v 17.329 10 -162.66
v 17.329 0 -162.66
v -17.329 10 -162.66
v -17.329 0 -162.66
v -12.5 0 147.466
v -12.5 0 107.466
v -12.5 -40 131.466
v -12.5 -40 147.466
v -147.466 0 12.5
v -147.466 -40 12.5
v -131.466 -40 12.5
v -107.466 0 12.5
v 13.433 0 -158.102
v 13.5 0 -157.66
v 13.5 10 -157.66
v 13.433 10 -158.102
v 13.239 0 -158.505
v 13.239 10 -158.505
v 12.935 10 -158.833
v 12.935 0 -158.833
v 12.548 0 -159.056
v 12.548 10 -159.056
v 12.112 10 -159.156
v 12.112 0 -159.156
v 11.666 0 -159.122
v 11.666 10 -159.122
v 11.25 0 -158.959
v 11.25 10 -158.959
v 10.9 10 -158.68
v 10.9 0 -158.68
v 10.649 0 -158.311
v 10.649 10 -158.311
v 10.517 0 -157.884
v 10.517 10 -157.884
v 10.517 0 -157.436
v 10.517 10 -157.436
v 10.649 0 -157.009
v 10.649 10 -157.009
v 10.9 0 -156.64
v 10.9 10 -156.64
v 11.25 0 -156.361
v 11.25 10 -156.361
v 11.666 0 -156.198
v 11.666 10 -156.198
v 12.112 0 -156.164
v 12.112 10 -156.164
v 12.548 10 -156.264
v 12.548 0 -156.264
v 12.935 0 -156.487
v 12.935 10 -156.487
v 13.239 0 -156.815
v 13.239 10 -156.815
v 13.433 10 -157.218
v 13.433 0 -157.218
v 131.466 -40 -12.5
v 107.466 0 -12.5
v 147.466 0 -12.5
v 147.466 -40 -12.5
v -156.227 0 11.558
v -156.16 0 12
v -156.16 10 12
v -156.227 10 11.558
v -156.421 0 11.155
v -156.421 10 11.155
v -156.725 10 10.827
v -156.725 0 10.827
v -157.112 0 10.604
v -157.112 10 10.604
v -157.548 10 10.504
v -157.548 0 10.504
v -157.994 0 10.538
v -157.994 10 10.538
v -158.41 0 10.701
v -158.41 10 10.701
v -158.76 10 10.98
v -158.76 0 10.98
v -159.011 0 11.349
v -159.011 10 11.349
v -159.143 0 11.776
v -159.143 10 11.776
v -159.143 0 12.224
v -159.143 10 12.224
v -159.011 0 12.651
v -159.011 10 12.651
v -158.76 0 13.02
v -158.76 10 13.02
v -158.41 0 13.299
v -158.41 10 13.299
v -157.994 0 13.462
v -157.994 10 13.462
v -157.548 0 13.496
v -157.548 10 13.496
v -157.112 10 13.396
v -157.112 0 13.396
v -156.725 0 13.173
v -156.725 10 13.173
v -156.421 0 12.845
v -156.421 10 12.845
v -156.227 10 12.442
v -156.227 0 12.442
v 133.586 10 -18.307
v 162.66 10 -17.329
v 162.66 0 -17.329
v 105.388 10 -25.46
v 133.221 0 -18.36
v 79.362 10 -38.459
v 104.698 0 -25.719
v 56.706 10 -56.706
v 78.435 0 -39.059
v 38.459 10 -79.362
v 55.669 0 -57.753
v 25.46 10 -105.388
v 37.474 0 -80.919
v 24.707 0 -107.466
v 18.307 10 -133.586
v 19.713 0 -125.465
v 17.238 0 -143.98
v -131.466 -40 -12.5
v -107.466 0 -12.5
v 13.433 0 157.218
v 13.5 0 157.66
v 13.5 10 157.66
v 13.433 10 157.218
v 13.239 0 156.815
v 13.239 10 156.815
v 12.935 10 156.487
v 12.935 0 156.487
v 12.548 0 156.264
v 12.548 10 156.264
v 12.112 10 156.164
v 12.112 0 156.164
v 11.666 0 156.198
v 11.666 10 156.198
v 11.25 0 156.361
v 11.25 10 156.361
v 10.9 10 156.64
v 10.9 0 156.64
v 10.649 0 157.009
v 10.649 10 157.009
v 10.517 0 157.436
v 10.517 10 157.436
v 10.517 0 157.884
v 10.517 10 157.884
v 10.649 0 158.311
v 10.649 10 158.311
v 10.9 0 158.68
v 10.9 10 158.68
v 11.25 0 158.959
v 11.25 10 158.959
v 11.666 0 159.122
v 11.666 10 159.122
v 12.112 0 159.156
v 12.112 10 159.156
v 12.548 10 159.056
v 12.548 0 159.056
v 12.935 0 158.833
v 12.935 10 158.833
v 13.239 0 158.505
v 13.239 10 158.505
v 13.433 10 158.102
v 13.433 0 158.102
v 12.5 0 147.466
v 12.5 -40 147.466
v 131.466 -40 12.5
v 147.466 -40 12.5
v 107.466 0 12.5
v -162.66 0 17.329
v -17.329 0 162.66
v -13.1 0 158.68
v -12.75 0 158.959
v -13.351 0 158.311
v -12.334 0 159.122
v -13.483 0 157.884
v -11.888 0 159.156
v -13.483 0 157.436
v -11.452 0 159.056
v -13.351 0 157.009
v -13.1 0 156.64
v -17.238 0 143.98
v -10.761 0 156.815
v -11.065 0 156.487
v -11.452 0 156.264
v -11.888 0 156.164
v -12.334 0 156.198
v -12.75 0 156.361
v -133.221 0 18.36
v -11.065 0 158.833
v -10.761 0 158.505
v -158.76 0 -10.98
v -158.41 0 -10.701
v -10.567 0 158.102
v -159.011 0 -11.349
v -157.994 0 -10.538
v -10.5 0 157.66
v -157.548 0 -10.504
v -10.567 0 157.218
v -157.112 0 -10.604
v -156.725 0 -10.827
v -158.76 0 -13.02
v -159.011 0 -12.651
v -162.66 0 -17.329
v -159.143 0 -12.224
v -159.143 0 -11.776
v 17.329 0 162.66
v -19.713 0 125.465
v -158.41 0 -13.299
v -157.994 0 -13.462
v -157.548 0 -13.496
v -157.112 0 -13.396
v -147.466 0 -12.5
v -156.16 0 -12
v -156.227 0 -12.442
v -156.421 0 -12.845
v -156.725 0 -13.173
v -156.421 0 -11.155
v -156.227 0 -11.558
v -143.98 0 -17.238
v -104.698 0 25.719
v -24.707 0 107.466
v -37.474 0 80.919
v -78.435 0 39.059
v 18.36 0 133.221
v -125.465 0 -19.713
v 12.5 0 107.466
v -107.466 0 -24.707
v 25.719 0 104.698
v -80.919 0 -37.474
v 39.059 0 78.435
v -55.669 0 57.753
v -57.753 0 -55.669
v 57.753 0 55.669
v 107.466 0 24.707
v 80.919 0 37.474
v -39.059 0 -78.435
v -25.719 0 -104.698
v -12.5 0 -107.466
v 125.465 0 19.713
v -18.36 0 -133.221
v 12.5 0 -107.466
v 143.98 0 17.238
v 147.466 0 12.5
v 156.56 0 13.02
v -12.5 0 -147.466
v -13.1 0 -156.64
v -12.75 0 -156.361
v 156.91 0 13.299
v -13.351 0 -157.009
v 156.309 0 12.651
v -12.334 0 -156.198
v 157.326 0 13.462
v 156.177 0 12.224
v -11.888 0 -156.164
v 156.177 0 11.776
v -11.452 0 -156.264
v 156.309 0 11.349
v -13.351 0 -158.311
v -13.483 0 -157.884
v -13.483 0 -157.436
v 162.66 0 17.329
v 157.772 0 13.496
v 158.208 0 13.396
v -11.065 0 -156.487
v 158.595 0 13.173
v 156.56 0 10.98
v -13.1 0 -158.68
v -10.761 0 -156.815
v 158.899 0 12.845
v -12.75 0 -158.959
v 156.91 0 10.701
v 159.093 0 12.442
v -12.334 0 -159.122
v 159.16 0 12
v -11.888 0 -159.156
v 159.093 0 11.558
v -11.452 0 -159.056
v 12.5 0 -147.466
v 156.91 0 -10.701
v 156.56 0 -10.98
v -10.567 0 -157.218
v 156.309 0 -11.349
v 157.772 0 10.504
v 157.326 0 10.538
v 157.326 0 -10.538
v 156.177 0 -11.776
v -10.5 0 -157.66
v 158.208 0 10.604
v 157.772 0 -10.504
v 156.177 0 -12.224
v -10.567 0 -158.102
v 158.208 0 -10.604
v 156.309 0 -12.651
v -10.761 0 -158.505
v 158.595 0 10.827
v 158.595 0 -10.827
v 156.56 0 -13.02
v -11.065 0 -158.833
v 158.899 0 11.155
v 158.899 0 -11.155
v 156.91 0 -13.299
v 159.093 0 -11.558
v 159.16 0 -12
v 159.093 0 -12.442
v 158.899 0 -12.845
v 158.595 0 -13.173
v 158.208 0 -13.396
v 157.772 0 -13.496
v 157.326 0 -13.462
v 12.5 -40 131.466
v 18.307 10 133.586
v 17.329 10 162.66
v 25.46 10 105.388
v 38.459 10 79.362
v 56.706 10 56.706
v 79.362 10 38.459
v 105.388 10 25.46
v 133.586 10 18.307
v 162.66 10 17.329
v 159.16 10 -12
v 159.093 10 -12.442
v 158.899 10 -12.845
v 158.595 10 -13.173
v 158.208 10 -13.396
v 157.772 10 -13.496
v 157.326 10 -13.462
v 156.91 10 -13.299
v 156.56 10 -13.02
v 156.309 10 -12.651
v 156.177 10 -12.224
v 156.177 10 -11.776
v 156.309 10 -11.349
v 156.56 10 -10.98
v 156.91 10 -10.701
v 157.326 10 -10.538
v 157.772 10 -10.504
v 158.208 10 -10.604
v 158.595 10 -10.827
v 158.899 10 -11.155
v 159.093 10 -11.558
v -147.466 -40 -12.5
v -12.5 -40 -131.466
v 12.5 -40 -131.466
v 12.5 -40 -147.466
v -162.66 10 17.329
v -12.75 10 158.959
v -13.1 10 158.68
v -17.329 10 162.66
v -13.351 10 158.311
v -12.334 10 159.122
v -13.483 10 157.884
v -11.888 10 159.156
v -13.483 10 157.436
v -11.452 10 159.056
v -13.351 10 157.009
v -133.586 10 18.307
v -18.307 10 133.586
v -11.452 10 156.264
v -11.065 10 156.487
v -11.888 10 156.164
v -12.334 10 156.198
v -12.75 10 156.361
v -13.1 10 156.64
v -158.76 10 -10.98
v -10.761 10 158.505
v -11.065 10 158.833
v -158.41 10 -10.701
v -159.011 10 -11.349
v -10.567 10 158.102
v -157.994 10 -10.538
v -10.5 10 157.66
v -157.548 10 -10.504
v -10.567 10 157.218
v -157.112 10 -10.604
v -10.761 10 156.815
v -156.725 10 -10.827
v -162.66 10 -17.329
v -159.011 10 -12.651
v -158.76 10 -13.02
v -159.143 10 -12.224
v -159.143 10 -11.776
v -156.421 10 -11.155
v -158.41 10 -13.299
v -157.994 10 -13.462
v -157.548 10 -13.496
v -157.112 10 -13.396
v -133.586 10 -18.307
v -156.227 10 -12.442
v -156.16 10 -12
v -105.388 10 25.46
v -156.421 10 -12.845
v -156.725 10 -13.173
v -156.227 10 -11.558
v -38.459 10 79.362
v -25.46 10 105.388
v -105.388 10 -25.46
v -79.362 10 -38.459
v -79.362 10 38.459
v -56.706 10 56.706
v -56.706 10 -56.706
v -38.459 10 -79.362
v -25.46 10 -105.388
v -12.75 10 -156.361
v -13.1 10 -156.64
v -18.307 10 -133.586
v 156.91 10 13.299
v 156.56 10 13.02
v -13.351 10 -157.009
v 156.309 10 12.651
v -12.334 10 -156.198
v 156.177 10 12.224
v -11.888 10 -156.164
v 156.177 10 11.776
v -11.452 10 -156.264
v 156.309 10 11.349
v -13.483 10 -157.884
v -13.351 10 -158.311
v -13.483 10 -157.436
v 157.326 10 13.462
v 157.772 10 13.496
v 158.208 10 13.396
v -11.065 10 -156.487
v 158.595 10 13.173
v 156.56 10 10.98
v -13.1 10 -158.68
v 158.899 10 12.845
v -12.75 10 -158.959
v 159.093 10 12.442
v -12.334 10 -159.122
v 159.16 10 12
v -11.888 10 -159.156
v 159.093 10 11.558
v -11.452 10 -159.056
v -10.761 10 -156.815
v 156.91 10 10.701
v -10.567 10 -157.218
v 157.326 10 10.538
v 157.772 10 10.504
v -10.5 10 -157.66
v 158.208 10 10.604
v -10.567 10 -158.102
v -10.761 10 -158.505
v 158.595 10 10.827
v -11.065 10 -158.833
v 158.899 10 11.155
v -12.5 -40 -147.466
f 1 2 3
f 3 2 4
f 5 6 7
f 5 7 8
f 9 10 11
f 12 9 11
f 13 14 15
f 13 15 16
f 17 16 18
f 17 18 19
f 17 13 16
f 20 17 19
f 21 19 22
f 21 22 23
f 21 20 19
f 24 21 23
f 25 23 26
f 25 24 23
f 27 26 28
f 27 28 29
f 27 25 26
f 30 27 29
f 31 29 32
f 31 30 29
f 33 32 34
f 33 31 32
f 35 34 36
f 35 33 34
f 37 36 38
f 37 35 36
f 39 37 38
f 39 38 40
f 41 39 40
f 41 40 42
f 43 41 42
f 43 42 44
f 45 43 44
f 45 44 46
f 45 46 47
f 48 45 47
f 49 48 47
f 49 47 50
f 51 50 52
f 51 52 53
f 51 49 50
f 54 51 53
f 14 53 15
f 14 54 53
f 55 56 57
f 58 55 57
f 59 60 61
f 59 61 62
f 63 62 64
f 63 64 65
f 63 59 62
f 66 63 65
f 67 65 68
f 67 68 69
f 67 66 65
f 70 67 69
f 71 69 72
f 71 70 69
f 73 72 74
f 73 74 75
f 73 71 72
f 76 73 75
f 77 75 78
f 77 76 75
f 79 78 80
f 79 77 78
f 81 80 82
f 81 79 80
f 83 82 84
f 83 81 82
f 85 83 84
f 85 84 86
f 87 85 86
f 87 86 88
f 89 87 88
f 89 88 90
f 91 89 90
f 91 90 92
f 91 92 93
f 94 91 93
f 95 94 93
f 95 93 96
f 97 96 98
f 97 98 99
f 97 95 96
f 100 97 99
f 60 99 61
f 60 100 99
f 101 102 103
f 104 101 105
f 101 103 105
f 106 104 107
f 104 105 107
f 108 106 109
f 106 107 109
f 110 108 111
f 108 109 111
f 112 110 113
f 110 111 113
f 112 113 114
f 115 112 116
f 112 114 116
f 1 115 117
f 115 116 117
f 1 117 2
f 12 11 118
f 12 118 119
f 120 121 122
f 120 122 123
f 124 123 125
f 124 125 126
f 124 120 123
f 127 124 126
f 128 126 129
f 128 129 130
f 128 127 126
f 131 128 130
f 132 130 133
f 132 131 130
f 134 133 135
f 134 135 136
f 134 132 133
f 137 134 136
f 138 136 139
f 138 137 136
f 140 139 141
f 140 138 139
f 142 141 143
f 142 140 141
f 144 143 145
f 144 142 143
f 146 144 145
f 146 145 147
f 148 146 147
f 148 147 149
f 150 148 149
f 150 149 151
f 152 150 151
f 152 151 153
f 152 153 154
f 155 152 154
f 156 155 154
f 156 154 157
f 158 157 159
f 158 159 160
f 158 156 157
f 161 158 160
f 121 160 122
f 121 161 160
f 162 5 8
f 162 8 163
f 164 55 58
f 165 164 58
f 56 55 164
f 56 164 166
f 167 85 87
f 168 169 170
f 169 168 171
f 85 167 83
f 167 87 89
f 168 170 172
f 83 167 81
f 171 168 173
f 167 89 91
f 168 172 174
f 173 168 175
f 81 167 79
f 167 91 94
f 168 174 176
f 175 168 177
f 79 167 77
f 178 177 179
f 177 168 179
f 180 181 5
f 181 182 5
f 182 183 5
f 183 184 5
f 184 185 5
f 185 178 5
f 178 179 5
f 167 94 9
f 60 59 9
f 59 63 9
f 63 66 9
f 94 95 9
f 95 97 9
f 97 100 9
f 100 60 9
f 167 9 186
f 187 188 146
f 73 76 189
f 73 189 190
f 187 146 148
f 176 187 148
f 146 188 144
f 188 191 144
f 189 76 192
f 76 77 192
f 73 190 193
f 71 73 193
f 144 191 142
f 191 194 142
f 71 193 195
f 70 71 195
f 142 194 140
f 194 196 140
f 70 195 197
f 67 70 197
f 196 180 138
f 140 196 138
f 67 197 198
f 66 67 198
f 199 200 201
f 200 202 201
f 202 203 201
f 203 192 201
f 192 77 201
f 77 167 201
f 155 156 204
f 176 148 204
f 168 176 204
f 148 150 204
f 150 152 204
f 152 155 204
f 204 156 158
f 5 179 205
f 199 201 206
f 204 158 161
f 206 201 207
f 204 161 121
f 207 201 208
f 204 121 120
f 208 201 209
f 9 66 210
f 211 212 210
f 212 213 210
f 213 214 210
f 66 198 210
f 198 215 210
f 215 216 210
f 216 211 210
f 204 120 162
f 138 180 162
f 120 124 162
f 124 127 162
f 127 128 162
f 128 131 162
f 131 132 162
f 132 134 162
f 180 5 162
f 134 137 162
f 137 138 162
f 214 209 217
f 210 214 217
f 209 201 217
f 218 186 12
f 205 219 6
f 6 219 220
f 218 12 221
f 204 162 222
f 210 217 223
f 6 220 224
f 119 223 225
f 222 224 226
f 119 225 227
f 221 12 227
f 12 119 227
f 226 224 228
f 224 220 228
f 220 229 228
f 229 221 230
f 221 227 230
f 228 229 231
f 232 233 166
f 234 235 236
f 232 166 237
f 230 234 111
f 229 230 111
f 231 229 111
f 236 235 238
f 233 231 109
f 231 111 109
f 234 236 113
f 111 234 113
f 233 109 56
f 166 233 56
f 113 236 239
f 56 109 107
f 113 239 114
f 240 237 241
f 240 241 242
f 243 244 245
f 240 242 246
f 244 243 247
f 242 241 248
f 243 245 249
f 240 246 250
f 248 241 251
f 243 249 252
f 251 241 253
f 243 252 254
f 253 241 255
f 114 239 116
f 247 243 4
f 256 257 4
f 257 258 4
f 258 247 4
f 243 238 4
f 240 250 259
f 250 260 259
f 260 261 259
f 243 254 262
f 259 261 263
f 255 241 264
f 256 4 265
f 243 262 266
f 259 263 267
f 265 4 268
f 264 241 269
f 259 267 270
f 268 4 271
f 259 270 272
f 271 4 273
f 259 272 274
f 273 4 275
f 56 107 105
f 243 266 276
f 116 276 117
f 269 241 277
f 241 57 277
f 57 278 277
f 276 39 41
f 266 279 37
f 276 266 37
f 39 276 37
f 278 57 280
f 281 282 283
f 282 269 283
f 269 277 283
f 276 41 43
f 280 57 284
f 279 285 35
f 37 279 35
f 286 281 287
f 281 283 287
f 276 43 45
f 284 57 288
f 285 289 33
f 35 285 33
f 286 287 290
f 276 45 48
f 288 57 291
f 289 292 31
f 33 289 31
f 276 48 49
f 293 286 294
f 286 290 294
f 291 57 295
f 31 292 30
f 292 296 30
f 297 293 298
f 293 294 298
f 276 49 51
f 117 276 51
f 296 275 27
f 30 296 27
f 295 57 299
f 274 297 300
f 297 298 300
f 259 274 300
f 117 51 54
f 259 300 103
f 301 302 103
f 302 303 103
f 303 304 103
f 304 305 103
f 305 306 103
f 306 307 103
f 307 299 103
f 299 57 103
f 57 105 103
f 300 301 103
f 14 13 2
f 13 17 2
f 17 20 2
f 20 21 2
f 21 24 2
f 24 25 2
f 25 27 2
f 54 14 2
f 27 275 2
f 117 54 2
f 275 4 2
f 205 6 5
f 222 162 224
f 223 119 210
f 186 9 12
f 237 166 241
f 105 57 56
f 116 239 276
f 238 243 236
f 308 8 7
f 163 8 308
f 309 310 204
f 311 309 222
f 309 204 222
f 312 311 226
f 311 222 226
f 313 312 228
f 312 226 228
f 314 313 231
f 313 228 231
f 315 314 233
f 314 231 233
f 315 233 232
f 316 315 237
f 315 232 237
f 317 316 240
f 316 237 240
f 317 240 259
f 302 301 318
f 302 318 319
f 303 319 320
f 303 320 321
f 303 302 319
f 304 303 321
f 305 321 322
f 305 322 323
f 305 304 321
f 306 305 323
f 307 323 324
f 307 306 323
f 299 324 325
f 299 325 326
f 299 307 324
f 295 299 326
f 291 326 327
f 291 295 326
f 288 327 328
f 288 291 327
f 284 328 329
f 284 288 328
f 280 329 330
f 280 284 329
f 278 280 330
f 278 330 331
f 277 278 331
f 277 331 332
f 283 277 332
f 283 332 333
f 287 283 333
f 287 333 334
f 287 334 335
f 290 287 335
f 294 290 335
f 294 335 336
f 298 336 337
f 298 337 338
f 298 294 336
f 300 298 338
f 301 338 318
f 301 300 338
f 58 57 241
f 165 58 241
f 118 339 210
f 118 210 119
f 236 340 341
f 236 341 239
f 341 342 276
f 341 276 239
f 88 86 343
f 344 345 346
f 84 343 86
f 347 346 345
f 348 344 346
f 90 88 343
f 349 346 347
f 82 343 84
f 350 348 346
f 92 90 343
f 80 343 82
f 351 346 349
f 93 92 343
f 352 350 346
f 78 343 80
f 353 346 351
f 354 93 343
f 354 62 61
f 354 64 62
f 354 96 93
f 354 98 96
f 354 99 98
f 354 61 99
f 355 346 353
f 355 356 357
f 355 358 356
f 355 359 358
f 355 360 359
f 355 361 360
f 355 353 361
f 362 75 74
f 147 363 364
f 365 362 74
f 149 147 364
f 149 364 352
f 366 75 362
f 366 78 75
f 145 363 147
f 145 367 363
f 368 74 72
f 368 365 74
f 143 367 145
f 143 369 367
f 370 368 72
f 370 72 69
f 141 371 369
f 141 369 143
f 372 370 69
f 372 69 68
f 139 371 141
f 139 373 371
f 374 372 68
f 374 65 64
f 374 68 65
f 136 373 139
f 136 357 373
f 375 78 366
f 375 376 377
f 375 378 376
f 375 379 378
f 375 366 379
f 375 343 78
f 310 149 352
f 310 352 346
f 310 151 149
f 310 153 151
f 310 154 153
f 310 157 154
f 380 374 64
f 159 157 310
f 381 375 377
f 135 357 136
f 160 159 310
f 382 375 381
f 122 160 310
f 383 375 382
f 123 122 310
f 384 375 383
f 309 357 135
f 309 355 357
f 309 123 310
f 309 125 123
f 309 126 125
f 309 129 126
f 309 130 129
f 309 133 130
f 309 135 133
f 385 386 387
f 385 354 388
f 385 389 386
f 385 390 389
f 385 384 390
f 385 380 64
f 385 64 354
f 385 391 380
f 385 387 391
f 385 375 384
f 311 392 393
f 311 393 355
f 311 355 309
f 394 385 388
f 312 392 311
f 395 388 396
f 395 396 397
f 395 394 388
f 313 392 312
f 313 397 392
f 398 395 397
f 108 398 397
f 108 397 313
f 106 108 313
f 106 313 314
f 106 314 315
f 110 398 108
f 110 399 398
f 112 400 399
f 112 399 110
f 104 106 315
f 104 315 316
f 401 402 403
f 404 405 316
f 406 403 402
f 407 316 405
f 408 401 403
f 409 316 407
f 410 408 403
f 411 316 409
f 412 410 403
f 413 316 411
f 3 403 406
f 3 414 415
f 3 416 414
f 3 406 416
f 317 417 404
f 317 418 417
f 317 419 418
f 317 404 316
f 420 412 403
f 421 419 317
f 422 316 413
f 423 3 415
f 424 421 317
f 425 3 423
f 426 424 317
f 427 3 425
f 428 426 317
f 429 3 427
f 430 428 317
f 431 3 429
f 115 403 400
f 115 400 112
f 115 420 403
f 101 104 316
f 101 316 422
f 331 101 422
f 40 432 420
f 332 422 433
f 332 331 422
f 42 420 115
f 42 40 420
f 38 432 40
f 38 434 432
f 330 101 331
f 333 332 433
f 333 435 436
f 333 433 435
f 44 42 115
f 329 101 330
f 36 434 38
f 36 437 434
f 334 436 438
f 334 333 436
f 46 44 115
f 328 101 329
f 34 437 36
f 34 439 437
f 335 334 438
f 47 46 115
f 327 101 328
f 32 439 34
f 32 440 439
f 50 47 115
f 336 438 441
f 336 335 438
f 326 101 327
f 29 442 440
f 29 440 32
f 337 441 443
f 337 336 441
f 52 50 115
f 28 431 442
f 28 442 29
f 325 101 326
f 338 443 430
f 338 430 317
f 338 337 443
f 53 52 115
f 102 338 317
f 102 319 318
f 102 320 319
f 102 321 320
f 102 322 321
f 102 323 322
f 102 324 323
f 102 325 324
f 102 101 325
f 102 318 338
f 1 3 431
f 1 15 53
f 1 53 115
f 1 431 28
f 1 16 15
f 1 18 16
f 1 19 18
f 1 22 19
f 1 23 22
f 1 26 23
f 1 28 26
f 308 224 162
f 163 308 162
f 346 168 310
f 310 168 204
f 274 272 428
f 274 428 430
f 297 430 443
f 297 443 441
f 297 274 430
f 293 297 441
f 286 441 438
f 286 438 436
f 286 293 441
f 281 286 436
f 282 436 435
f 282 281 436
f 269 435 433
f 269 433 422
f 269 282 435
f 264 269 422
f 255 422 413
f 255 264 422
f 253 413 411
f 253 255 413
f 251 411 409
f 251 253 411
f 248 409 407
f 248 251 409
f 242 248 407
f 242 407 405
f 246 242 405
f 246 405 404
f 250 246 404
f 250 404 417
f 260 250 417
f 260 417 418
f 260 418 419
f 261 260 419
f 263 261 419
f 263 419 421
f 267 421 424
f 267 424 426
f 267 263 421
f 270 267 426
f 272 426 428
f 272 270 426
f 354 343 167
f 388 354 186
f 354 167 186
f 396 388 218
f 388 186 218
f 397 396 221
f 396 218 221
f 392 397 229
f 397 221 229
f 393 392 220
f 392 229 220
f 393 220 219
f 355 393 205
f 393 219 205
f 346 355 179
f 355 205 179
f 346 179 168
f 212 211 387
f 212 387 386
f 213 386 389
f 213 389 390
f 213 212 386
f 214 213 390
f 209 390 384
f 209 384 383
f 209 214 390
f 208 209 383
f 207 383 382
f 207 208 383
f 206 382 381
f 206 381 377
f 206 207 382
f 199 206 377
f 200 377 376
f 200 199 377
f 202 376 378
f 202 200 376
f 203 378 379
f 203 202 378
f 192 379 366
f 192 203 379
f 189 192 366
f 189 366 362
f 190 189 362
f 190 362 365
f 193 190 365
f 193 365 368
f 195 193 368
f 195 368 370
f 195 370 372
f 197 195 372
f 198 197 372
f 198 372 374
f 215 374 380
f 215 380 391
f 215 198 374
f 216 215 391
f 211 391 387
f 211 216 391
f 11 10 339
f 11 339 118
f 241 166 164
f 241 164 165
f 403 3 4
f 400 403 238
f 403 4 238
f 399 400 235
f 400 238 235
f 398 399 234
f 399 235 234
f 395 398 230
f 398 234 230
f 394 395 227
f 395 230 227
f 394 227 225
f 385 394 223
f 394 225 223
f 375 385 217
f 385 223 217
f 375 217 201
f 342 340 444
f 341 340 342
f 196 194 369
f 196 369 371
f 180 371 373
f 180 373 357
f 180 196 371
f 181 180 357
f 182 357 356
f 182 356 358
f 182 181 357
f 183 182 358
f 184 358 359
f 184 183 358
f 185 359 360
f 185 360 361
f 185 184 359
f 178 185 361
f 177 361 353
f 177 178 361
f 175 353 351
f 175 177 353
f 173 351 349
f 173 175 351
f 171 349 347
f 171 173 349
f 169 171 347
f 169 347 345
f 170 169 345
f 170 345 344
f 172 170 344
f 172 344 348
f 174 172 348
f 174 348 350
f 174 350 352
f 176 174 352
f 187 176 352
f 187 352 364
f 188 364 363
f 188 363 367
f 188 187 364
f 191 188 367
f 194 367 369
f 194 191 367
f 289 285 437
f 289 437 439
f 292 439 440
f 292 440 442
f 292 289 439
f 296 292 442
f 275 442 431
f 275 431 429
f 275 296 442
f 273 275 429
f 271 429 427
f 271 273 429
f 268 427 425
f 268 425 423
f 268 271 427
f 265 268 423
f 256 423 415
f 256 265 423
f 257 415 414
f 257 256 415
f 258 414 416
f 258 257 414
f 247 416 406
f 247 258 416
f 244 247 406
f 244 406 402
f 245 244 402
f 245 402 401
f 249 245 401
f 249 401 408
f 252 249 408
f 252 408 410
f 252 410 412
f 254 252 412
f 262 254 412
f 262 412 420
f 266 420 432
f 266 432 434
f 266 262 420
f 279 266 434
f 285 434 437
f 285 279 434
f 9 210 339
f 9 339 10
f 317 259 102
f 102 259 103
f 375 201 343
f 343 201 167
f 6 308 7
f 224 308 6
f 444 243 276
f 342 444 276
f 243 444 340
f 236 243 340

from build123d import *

# Parameters (mm, degrees)
SKETCH2_R           = 1.5
BOSS_EXTRUDE1_DEPTH = 10
SKETCH3_W           = 25
SKETCH3_H           = 40
SKETCH3_W_2         = 40
SKETCH3_H_2         = 25
BOSS_EXTRUDE2_DEPTH = 40
CUT_EXTRUDE1_DEPTH  = 40
CIRPATTERN1_COUNT   = 4


with BuildPart() as part:
    # Sketch2 → Boss-Extrude1 (new body)
    with BuildSketch(Plane(origin=(0, 0, 0), x_dir=(1, 0, 0), z_dir=(0, 1, 0))):
        with BuildLine():
            Line((162.66, -17.328961432), (162.66, 17.328961432))
            ThreePointArc((162.66, 17.328961432), (56.705609793, 56.705609793), (17.328961432, 162.66))
            Line((17.328961432, 162.66), (-17.328961432, 162.66))
            ThreePointArc((-17.328961432, 162.66), (-56.705609793, 56.705609793), (-162.66, 17.328961432))
            Line((-162.66, 17.328961432), (-162.66, -17.328961432))
            ThreePointArc((-162.66, -17.328961432), (-56.705609793, -56.705609793), (-17.328961432, -162.66))
            Line((-17.328961432, -162.66), (17.328961432, -162.66))
            ThreePointArc((17.328961432, -162.66), (56.705609793, -56.705609793), (162.66, -17.328961432))
        make_face()
        with Locations((-12, -157.66)):
            Circle(SKETCH2_R, mode=Mode.SUBTRACT)
        with Locations((-157.66, -12)):
            Circle(SKETCH2_R, mode=Mode.SUBTRACT)
        with Locations((12, -157.66)):
            Circle(SKETCH2_R, mode=Mode.SUBTRACT)
        with Locations((157.66, -12)):
            Circle(SKETCH2_R, mode=Mode.SUBTRACT)
        with Locations((-157.66, 12)):
            Circle(SKETCH2_R, mode=Mode.SUBTRACT)
        with Locations((-12, 157.66)):
            Circle(SKETCH2_R, mode=Mode.SUBTRACT)
        with Locations((157.66, 12)):
            Circle(SKETCH2_R, mode=Mode.SUBTRACT)
        with Locations((12, 157.66)):
            Circle(SKETCH2_R, mode=Mode.SUBTRACT)
    extrude(amount=BOSS_EXTRUDE1_DEPTH)

    # Sketch3 → Boss-Extrude2 (add)
    with BuildSketch(Plane.XZ):
        with Locations((0, 127.465698487)):
            Rectangle(SKETCH3_W, SKETCH3_H)
        with Locations((127.465698487, 0)):
            Rectangle(SKETCH3_W_2, SKETCH3_H_2)
        with Locations((0, -127.465698487)):
            Rectangle(SKETCH3_W, SKETCH3_H)
        with Locations((-127.465698487, 0)):
            Rectangle(SKETCH3_W_2, SKETCH3_H_2)
    extrude(amount=BOSS_EXTRUDE2_DEPTH)

    # Sketch4 → Cut-Extrude1 (cut)
    with BuildSketch(Plane(origin=(0, 0, -12.5), x_dir=(-1, 0, 0), z_dir=(0, 0, -1))):
        Polygon((-131.465698487, -40), (-107.465698487, 0), (-107.465698487, -40), align=None)
    cut_extrude1 = extrude(amount=-CUT_EXTRUDE1_DEPTH, mode=Mode.SUBTRACT)

    # CirPattern1: Cut-Extrude1 ×4 about axis
    cirpattern1_axis = Axis((0, 0, 0), (0, 1, 0))
    for i in range(1, CIRPATTERN1_COUNT):
        add(cut_extrude1.rotate(cirpattern1_axis, i * 360 / CIRPATTERN1_COUNT), mode=Mode.SUBTRACT)


solid = part.part
